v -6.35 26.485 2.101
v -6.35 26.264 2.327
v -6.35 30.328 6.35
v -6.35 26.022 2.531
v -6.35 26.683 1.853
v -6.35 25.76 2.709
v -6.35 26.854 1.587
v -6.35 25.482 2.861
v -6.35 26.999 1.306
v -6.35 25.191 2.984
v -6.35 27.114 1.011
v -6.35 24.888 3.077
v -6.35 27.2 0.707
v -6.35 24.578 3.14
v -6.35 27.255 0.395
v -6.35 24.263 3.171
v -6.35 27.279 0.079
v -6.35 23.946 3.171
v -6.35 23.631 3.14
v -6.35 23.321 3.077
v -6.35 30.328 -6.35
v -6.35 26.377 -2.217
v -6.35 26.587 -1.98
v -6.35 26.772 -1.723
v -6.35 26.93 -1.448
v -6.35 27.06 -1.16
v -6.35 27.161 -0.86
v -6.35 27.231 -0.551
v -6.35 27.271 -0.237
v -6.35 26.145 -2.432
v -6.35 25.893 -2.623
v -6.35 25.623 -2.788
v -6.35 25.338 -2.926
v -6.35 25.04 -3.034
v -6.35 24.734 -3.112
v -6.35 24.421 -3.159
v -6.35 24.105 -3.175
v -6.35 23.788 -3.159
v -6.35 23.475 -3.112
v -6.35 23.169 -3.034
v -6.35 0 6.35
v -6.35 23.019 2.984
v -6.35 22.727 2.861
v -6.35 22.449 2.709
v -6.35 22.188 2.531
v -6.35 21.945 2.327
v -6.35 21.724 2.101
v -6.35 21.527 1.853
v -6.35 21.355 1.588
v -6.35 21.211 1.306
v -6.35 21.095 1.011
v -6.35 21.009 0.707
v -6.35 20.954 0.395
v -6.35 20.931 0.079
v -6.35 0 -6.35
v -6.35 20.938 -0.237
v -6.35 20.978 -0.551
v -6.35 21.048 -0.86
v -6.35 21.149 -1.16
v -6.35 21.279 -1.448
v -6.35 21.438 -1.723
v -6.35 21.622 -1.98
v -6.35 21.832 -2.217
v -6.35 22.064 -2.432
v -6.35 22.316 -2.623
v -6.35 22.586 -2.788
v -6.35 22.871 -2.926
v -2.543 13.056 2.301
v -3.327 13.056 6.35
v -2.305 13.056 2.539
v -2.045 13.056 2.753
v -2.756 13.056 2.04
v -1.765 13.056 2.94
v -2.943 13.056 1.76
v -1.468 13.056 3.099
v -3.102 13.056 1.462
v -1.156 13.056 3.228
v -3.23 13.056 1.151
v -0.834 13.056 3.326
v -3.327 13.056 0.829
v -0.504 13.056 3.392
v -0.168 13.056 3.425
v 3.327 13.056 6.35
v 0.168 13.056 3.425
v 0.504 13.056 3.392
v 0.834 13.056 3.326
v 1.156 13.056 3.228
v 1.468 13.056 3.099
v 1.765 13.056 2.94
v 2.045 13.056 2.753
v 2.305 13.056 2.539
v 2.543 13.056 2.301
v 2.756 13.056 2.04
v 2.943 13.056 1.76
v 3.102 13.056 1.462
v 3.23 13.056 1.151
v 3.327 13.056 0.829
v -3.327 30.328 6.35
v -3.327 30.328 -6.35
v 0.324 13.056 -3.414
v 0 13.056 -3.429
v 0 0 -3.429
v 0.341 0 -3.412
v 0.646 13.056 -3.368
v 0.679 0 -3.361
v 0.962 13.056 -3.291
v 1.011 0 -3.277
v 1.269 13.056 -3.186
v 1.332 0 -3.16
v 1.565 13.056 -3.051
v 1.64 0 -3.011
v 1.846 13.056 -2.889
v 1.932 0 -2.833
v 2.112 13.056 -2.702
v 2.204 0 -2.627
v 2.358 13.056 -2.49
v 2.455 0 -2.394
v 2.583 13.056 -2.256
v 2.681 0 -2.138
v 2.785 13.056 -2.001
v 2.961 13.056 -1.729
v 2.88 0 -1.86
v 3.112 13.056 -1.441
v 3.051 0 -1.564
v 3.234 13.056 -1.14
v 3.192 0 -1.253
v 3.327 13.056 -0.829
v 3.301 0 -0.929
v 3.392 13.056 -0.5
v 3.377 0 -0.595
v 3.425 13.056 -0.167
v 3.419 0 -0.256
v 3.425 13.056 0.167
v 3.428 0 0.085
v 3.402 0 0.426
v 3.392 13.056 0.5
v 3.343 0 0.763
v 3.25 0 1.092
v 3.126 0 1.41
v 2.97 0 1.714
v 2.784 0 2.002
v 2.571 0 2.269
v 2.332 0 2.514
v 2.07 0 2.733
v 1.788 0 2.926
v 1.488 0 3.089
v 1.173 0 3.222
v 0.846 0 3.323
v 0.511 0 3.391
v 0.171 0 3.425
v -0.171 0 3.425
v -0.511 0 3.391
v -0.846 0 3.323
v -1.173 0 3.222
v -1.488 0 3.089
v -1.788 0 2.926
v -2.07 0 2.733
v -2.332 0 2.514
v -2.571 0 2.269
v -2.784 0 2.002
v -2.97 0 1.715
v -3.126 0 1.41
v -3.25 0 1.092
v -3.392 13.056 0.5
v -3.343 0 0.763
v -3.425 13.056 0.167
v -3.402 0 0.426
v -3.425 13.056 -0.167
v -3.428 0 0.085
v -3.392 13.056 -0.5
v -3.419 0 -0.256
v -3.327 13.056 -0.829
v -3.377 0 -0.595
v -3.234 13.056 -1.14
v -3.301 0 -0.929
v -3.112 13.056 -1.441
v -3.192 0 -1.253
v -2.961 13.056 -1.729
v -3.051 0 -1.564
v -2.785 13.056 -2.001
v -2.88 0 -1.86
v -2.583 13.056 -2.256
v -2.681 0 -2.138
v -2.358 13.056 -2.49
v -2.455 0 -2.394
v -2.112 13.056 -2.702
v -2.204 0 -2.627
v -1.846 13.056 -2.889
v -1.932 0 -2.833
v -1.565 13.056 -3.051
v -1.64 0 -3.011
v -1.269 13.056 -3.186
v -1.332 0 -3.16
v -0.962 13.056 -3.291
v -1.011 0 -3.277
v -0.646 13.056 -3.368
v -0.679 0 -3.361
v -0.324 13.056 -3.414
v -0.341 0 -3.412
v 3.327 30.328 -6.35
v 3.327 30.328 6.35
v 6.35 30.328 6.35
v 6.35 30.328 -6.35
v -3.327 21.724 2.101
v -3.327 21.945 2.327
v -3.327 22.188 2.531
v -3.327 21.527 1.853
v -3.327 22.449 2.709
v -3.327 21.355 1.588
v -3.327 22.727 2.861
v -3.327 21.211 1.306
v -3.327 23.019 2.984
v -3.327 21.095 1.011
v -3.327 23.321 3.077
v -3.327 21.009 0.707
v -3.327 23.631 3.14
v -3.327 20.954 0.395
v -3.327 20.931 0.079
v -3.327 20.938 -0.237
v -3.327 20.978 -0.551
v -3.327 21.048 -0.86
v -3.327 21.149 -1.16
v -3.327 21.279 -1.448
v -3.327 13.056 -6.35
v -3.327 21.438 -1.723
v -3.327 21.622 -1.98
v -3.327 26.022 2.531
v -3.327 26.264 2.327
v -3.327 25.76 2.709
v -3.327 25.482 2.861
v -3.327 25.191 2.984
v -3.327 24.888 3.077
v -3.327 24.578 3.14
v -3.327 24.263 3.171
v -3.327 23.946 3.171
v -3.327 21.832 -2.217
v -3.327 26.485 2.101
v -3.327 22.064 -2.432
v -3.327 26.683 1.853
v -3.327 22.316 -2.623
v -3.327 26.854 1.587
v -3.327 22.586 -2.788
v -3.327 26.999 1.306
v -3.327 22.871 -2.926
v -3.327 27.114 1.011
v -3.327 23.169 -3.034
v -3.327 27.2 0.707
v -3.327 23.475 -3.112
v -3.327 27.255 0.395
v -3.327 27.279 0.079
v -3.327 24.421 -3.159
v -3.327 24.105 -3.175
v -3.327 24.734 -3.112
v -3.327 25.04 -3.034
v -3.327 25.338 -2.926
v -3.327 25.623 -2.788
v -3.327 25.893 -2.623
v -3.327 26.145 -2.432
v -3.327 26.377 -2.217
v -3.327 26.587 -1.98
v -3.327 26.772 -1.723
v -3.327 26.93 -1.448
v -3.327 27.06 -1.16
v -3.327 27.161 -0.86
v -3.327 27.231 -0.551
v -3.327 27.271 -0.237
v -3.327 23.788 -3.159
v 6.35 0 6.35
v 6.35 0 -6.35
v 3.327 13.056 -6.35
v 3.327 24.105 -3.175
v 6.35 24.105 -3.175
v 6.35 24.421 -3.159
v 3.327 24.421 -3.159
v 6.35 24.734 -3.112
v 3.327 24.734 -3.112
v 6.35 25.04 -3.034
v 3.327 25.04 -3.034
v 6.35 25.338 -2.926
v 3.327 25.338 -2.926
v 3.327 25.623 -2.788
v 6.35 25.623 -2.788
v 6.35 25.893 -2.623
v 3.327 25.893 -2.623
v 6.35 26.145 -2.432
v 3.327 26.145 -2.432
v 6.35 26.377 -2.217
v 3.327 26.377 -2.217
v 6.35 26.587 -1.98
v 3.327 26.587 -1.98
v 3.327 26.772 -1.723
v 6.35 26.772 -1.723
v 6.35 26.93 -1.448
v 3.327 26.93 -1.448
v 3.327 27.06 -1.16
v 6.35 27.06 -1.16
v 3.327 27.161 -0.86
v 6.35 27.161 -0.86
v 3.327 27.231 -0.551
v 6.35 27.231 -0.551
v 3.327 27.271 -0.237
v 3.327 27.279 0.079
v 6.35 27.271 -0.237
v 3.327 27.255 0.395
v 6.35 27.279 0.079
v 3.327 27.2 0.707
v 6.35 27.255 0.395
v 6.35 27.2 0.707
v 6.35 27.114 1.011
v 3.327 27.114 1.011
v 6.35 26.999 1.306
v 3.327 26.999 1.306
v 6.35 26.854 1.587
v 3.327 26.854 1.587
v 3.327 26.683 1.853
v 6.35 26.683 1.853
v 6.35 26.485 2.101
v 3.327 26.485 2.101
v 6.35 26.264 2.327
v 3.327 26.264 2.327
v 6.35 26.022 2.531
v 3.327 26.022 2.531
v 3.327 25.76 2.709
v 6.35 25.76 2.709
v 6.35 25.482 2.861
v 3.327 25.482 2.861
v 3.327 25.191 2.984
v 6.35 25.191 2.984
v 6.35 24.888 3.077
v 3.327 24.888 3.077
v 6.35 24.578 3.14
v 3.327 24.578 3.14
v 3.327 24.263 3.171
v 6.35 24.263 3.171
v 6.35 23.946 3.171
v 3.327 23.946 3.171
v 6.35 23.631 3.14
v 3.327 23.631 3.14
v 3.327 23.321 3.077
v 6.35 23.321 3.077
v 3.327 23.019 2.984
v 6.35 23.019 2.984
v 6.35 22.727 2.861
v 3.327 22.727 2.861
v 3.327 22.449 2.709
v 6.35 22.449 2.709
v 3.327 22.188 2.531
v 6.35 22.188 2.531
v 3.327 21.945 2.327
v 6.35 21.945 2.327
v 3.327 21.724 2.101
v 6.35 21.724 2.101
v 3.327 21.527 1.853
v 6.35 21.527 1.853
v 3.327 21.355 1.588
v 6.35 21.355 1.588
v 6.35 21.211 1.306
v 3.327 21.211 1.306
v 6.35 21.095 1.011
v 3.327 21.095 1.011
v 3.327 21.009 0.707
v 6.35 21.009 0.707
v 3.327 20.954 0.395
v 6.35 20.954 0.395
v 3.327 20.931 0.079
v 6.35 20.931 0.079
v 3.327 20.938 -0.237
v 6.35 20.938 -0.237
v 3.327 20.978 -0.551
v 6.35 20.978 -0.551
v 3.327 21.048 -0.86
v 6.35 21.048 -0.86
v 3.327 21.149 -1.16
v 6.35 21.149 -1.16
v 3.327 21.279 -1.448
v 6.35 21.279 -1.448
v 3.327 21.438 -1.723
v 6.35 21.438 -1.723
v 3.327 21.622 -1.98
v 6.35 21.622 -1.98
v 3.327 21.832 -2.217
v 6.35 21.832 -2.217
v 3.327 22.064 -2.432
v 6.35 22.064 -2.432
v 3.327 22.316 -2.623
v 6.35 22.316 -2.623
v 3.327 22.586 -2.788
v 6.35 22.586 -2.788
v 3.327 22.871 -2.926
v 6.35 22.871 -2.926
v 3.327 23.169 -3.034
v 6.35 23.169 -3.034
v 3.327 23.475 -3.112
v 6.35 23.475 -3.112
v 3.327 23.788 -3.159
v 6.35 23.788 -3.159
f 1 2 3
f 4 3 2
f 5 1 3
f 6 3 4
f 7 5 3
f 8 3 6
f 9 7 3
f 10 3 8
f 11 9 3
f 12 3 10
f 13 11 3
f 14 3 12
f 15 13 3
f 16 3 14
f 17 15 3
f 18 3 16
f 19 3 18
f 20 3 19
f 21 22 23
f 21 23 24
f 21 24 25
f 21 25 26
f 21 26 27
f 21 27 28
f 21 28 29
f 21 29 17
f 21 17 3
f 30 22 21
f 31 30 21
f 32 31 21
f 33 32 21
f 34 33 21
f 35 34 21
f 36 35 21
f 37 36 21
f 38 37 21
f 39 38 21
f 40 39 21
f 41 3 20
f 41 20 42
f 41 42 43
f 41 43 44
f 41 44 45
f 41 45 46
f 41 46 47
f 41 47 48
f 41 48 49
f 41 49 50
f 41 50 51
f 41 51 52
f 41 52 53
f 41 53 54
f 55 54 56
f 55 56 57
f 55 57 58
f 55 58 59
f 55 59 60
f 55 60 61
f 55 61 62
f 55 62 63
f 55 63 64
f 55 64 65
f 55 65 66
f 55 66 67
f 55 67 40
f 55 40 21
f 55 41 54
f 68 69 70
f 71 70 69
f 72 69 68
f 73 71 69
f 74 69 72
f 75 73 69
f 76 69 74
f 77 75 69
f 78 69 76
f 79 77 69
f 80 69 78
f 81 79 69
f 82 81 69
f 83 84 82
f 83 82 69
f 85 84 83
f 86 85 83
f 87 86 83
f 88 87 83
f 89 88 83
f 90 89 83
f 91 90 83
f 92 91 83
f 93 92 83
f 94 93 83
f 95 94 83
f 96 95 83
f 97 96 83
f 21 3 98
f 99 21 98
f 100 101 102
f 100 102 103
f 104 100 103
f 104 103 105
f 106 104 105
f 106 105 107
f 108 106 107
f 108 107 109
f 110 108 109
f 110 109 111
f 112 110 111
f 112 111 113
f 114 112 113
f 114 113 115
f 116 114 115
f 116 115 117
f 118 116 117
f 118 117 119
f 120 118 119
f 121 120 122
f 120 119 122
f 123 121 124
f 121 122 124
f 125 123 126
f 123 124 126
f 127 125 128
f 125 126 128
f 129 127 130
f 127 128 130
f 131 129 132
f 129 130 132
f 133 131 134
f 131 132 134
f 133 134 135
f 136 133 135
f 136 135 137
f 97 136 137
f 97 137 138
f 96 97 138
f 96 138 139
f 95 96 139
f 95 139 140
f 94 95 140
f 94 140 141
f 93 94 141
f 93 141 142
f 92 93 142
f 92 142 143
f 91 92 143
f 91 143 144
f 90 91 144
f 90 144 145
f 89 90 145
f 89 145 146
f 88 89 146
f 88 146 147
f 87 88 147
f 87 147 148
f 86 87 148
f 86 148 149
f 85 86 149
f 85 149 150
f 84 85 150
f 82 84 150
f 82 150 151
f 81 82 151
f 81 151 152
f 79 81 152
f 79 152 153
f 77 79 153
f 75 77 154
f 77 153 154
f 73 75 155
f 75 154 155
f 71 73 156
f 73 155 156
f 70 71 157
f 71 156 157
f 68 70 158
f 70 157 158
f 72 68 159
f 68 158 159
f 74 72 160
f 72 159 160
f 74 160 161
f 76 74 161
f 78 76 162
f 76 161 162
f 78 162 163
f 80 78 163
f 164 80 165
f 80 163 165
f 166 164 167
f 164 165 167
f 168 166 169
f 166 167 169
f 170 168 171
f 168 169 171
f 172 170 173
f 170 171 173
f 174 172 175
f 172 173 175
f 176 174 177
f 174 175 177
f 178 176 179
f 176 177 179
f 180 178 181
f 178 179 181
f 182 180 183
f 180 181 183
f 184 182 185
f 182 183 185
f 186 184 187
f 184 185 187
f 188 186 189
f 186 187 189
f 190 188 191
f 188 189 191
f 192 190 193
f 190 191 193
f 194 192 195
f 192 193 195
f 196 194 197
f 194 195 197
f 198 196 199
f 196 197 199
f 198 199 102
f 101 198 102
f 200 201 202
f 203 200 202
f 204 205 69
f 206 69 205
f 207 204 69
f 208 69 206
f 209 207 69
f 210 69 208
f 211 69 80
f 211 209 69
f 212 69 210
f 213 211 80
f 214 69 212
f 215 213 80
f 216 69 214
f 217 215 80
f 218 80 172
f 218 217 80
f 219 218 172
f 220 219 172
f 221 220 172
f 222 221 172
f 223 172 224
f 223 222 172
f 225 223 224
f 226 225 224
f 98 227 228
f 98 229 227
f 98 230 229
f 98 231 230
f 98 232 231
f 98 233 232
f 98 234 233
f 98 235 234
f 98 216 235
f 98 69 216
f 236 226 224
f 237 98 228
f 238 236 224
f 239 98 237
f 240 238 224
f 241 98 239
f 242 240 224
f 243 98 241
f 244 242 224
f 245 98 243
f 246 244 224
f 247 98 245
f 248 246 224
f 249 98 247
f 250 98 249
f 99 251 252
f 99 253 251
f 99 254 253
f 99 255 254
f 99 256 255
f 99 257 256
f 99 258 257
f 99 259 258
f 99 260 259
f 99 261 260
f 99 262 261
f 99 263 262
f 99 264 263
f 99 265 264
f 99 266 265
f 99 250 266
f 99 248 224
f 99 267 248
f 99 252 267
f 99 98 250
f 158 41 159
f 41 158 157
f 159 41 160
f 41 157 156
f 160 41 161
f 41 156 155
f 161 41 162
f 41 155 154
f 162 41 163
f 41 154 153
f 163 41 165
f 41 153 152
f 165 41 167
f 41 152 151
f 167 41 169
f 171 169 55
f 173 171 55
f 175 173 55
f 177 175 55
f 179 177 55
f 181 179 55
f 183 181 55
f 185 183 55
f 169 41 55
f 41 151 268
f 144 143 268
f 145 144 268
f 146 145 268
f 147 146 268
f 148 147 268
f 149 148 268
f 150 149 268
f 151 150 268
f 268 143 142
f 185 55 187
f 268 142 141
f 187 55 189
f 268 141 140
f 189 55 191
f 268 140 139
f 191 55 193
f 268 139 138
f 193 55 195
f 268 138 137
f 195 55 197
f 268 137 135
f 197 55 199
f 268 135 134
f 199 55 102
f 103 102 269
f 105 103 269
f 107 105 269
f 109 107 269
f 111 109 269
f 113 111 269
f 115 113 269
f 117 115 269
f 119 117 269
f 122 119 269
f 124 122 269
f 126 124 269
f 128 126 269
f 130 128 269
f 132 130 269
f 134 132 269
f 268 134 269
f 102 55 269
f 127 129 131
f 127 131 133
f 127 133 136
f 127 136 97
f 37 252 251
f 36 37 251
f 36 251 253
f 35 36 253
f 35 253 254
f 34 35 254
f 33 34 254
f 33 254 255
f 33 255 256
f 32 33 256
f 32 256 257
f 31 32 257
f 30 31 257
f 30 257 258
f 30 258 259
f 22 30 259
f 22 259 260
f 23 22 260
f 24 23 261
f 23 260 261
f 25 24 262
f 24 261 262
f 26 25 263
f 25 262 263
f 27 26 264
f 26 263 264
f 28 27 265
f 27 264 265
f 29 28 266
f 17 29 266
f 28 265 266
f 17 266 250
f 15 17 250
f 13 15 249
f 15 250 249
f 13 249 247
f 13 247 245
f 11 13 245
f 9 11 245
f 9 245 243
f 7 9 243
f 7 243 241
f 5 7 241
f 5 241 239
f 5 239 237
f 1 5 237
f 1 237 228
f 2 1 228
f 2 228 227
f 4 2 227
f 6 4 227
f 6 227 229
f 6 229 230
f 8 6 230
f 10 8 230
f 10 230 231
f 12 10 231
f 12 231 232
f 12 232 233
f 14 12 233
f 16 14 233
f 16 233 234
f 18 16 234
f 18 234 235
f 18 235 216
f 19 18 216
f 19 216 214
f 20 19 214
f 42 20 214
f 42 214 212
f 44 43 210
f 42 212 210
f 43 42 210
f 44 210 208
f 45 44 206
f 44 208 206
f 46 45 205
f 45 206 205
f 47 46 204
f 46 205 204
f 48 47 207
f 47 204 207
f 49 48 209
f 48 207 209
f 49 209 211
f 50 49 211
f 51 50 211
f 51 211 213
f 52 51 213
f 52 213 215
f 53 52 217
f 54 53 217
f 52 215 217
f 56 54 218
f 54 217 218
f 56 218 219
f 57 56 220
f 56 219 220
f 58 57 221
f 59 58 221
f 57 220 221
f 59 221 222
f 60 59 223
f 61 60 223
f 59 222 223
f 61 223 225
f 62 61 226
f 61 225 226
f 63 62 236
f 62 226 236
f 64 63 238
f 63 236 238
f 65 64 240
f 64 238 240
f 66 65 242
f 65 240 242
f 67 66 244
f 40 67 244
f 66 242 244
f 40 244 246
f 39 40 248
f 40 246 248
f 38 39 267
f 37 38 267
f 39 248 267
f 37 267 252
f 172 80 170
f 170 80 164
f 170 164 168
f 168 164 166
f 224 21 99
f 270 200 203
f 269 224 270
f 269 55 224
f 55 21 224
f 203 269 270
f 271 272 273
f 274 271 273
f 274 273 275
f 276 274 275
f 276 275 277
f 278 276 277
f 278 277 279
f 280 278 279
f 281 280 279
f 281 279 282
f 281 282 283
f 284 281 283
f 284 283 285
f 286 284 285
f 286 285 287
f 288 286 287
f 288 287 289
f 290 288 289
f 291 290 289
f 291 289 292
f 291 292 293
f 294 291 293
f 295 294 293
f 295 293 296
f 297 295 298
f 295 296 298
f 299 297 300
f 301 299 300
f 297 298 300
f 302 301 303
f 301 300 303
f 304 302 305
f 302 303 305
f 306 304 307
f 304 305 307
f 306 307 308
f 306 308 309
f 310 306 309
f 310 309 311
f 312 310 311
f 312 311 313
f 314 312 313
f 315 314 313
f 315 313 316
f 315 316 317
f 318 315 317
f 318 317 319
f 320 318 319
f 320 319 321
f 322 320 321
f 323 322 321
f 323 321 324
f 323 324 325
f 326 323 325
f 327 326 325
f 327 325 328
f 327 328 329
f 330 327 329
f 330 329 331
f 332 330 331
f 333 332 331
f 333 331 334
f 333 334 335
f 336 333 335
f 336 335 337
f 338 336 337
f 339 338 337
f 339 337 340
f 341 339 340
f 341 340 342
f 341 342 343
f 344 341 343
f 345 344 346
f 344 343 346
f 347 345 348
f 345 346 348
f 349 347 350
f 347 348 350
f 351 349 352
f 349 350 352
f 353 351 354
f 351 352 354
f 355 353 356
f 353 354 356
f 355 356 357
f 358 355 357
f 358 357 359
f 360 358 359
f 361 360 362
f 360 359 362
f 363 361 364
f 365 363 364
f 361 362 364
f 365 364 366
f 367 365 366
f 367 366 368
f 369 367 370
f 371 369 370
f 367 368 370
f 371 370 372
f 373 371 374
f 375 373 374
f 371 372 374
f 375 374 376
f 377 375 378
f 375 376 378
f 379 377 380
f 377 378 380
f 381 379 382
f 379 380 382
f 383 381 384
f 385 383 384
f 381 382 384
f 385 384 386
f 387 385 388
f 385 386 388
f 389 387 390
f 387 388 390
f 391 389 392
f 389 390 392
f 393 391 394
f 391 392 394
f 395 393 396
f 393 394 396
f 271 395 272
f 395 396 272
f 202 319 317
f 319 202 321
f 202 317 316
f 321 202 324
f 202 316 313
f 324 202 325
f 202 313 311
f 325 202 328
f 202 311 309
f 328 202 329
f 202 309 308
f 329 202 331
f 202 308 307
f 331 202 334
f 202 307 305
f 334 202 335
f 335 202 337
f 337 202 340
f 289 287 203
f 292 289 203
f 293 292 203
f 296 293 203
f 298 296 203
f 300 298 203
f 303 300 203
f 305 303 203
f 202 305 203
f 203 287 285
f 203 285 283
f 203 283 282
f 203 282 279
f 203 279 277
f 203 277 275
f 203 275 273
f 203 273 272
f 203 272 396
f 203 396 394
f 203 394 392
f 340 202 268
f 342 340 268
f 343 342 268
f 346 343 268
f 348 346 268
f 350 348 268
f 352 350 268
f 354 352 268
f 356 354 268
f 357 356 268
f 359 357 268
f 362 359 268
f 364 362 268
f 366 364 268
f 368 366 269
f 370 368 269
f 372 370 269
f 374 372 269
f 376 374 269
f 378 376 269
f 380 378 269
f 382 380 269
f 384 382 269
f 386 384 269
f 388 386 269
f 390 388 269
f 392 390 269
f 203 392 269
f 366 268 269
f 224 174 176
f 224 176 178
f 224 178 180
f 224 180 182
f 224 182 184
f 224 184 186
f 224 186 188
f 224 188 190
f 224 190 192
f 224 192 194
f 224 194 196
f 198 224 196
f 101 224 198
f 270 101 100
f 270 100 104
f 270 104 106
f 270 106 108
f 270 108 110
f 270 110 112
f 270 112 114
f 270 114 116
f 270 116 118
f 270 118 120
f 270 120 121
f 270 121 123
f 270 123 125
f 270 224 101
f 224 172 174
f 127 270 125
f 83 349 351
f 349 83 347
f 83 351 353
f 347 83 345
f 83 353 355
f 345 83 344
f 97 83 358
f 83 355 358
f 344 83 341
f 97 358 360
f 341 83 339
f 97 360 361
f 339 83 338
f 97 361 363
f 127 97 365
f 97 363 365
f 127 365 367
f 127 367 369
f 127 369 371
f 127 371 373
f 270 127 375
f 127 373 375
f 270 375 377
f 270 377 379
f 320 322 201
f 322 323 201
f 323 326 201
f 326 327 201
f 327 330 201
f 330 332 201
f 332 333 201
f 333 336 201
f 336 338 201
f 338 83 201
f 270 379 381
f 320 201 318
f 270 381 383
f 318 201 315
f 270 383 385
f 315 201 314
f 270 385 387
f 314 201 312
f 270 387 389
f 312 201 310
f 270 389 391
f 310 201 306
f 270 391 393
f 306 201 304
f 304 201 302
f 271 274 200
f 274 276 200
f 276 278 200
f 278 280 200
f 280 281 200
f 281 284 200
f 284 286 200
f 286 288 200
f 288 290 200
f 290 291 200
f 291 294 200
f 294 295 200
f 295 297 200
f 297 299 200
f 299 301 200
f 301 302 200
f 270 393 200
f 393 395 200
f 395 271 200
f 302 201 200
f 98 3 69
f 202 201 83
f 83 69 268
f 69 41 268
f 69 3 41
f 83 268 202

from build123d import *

# Parameters (mm, degrees)
SKETCH1_W           = 12.7
SKETCH1_H           = 12.7
BOSS_EXTRUDE1_DEPTH = 30.3276
SKETCH2_W           = 6.6548
SKETCH2_H           = 12.7
CUT_EXTRUDE1_DEPTH  = 17.272
SKETCH3_R           = 3.175
CUT_EXTRUDE2_DEPTH  = 34.486950022
SKETCH4_R           = 3.429
CUT_EXTRUDE3_DEPTH  = 13.0556


with BuildPart() as part:
    # Sketch1 → Boss-Extrude1 (new body)
    with BuildSketch(Plane(origin=(0, 0, 0), x_dir=(1, 0, 0), z_dir=(0, 1, 0))):
        Rectangle(SKETCH1_W, SKETCH1_H)
    extrude(amount=BOSS_EXTRUDE1_DEPTH)

    # Sketch2 → Cut-Extrude1 (cut)
    with BuildSketch(Plane(origin=(0, 30.3276, 0), x_dir=(1, 0, 0), z_dir=(0, 1, 0))):
        Rectangle(SKETCH2_W, SKETCH2_H)
    extrude(amount=-CUT_EXTRUDE1_DEPTH, mode=Mode.SUBTRACT)

    # Sketch3 → Cut-Extrude2 (cut, through all)
    with BuildSketch(Plane(origin=(6.35, 0, 0), x_dir=(0, 0, -1), z_dir=(1, 0, 0))):
        with Locations((0, 24.1046)):
            Circle(SKETCH3_R)
    extrude(amount=-CUT_EXTRUDE2_DEPTH, mode=Mode.SUBTRACT)

    # Sketch4 → Cut-Extrude3 (cut)
    with BuildSketch(Plane.XZ):
        with Locations(Location((0, 0, 0), (0, 0, 270))):
            Circle(SKETCH4_R)
    extrude(amount=-CUT_EXTRUDE3_DEPTH, mode=Mode.SUBTRACT)


solid = part.part
